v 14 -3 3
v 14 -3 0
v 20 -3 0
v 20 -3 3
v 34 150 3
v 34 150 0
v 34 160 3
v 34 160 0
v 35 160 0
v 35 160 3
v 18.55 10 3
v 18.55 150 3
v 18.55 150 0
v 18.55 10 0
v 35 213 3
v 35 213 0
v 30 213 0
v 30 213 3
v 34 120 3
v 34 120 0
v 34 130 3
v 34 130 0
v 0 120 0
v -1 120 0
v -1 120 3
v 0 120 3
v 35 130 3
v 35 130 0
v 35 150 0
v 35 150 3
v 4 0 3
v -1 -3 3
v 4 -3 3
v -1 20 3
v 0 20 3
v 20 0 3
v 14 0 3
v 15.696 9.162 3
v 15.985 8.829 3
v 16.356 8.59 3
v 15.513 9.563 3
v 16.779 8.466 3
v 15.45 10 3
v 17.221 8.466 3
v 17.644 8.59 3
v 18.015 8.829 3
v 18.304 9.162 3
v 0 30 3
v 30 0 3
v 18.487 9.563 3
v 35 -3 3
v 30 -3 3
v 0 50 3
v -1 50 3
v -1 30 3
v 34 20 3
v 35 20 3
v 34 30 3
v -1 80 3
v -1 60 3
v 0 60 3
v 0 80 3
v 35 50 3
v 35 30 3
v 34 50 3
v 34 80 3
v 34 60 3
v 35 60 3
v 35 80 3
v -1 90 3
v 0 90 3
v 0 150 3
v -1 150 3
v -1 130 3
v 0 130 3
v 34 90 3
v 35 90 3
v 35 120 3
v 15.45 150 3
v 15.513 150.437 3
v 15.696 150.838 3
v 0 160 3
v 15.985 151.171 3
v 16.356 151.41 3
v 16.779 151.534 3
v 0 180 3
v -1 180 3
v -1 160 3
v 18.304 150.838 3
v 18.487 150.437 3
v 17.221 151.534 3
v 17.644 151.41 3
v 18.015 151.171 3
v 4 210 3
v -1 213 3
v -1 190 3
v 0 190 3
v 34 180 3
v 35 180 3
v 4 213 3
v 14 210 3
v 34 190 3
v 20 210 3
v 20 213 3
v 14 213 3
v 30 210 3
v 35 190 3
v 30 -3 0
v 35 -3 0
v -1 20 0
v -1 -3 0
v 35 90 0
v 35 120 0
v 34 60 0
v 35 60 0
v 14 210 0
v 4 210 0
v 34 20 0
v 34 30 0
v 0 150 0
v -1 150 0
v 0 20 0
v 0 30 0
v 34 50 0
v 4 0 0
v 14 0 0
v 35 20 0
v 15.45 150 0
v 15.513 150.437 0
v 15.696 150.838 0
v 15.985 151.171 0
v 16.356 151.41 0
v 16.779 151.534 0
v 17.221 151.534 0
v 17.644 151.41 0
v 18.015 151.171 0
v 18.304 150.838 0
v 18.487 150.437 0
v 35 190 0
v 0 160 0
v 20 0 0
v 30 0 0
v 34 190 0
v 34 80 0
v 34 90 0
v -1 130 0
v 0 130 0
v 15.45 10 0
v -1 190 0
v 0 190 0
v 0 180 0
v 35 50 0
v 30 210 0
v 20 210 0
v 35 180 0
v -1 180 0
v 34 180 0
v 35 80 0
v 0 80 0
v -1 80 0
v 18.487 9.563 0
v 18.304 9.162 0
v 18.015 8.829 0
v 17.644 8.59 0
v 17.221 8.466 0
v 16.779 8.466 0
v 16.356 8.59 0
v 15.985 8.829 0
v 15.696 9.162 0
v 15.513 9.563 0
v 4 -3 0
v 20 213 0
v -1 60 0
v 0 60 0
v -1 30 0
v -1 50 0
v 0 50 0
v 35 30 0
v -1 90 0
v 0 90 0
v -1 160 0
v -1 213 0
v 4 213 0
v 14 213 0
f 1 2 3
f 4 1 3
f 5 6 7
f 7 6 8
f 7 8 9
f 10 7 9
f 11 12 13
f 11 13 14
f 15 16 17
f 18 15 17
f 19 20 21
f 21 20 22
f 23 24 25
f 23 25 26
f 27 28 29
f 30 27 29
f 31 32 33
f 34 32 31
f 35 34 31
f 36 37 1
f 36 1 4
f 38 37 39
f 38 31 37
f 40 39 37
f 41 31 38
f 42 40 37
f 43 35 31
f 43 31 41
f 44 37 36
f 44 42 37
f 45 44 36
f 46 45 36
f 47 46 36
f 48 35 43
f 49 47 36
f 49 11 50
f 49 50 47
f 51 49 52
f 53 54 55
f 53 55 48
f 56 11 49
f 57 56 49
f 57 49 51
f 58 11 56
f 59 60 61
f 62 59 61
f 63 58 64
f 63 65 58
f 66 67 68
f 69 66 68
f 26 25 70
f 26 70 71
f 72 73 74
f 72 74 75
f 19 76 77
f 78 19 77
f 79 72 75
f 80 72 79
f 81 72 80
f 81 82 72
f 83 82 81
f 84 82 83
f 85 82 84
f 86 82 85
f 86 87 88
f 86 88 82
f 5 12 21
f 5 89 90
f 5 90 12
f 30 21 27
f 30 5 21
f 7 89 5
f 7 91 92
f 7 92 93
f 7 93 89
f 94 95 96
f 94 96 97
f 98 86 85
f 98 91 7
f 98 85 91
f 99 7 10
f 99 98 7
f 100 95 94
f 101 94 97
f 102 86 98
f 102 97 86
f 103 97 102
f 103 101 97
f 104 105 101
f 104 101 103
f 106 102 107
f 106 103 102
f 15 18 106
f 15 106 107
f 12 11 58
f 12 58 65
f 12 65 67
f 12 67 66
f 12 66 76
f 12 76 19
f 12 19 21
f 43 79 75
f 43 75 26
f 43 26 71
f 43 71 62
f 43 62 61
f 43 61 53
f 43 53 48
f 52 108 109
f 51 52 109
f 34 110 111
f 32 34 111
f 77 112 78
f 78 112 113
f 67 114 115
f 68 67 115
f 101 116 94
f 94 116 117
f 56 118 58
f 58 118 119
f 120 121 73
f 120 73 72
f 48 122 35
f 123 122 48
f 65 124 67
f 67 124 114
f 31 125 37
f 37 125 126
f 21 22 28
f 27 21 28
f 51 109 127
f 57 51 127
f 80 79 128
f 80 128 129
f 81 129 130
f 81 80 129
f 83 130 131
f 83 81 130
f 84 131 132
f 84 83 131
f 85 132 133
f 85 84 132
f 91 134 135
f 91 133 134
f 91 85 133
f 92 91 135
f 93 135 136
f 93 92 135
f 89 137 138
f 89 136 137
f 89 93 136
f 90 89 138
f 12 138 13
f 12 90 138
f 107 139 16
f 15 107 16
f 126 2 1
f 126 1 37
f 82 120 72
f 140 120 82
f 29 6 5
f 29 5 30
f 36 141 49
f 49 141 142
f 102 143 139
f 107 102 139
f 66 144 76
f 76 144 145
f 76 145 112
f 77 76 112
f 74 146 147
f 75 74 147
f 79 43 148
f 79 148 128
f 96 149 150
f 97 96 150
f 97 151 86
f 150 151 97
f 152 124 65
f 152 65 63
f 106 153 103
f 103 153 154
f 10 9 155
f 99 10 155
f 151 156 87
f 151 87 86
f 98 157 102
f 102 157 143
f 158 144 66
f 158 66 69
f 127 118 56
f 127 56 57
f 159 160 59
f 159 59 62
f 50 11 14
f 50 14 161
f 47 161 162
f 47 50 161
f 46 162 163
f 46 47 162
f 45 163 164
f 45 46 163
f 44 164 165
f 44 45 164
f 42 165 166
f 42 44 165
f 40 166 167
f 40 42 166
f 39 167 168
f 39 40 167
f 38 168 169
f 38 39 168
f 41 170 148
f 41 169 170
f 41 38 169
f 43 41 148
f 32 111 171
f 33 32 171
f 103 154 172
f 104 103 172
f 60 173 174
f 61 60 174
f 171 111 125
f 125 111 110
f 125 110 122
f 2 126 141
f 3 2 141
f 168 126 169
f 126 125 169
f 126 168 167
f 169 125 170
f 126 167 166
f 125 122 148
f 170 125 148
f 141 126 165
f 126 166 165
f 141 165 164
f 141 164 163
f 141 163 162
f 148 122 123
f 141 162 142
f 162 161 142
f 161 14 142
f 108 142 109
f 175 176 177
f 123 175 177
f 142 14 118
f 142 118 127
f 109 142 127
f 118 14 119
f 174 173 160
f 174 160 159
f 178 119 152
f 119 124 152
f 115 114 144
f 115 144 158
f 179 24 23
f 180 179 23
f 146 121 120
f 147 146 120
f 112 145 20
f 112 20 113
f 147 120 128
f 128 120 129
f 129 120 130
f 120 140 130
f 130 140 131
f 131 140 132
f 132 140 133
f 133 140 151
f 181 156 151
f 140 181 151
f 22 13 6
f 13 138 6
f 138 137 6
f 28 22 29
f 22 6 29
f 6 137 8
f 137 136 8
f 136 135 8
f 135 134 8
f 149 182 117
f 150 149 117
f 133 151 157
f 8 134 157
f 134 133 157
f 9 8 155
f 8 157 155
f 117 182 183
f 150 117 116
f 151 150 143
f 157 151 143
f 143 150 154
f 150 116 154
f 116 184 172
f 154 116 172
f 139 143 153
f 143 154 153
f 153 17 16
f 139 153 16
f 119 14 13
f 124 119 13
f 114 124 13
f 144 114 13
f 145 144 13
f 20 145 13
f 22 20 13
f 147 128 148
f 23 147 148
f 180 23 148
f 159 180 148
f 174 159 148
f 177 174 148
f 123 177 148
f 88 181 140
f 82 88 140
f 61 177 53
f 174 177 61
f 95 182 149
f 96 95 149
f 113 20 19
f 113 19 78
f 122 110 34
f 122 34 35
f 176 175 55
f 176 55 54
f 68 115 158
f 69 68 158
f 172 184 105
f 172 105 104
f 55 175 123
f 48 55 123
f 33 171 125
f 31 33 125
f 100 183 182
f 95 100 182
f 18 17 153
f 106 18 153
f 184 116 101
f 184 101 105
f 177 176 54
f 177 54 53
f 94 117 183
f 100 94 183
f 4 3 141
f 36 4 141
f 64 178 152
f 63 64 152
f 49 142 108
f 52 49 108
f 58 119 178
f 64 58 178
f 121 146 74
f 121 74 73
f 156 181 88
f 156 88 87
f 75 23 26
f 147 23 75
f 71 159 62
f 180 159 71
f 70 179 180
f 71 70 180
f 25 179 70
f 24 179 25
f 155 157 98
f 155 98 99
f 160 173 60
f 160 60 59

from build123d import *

# Parameters (mm, degrees)
SKETCH1_W           = 34
SKETCH1_H           = 210
SKETCH1_W_2         = 1
SKETCH1_H_2         = 20
SKETCH1_H_3         = 30
SKETCH1_W_3         = 6
SKETCH1_H_4         = 3
BOSS_EXTRUDE1_DEPTH = 3
CUT_EXTRUDE1_DEPTH  = 216.877279953


with BuildPart() as part:
    # Sketch1 → Boss-Extrude1 (new body)
    with BuildSketch(Plane.XY):
        with Locations((17, 105)):
            Rectangle(SKETCH1_W, SKETCH1_H)
        with Locations((34.5, 200)):
            Rectangle(SKETCH1_W_2, SKETCH1_H_2)
        with Locations((-0.5, 200)):
            Rectangle(SKETCH1_W_2, SKETCH1_H_2)
        with Locations((-0.5, 170)):
            Rectangle(SKETCH1_W_2, SKETCH1_H_2)
        with Locations((34.5, 170)):
            Rectangle(SKETCH1_W_2, SKETCH1_H_2)
        with Locations((34.5, 140)):
            Rectangle(SKETCH1_W_2, SKETCH1_H_2)
        with Locations((-0.5, 140)):
            Rectangle(SKETCH1_W_2, SKETCH1_H_2)
        with Locations((-0.5, 105)):
            Rectangle(SKETCH1_W_2, SKETCH1_H_3)
        with Locations((34.5, 105)):
            Rectangle(SKETCH1_W_2, SKETCH1_H_3)
        with Locations((34.5, 70)):
            Rectangle(SKETCH1_W_2, SKETCH1_H_2)
        with Locations((-0.5, 70)):
            Rectangle(SKETCH1_W_2, SKETCH1_H_2)
        with Locations((-0.5, 40)):
            Rectangle(SKETCH1_W_2, SKETCH1_H_2)
        with Locations((34.5, 40)):
            Rectangle(SKETCH1_W_2, SKETCH1_H_2)
        with Locations((34.5, 10)):
            Rectangle(SKETCH1_W_2, SKETCH1_H_2)
        with Locations((-0.5, 10)):
            Rectangle(SKETCH1_W_2, SKETCH1_H_2)
        Polygon((4, 0), (0, 0), (-1, 0), (-1, -3), (4, -3), align=None)
        with Locations((17, -1.5)):
            Rectangle(SKETCH1_W_3, SKETCH1_H_4)
        Polygon((34, 0), (30, 0), (30, -3), (35, -3), (35, 0), align=None)
        Polygon((-1, 210), (0, 210), (4, 210), (4, 213), (-1, 213), align=None)
        with Locations((17, 211.5)):
            Rectangle(SKETCH1_W_3, SKETCH1_H_4)
        Polygon((30, 213), (30, 210), (34, 210), (35, 210), (35, 213), align=None)
    extrude(amount=BOSS_EXTRUDE1_DEPTH)

    # Sketch2 → Cut-Extrude1 (cut, through all)
    with BuildSketch(Plane.XY.offset(3)):
        with BuildLine():
            Line((18.55, 150), (18.55, 10))
            ThreePointArc((18.55, 10), (17, 8.45), (15.45, 10))
            Line((15.45, 10), (15.45, 150))
            ThreePointArc((15.45, 150), (17, 151.55), (18.55, 150))
        make_face()
    extrude(amount=-CUT_EXTRUDE1_DEPTH, mode=Mode.SUBTRACT)


solid = part.part
